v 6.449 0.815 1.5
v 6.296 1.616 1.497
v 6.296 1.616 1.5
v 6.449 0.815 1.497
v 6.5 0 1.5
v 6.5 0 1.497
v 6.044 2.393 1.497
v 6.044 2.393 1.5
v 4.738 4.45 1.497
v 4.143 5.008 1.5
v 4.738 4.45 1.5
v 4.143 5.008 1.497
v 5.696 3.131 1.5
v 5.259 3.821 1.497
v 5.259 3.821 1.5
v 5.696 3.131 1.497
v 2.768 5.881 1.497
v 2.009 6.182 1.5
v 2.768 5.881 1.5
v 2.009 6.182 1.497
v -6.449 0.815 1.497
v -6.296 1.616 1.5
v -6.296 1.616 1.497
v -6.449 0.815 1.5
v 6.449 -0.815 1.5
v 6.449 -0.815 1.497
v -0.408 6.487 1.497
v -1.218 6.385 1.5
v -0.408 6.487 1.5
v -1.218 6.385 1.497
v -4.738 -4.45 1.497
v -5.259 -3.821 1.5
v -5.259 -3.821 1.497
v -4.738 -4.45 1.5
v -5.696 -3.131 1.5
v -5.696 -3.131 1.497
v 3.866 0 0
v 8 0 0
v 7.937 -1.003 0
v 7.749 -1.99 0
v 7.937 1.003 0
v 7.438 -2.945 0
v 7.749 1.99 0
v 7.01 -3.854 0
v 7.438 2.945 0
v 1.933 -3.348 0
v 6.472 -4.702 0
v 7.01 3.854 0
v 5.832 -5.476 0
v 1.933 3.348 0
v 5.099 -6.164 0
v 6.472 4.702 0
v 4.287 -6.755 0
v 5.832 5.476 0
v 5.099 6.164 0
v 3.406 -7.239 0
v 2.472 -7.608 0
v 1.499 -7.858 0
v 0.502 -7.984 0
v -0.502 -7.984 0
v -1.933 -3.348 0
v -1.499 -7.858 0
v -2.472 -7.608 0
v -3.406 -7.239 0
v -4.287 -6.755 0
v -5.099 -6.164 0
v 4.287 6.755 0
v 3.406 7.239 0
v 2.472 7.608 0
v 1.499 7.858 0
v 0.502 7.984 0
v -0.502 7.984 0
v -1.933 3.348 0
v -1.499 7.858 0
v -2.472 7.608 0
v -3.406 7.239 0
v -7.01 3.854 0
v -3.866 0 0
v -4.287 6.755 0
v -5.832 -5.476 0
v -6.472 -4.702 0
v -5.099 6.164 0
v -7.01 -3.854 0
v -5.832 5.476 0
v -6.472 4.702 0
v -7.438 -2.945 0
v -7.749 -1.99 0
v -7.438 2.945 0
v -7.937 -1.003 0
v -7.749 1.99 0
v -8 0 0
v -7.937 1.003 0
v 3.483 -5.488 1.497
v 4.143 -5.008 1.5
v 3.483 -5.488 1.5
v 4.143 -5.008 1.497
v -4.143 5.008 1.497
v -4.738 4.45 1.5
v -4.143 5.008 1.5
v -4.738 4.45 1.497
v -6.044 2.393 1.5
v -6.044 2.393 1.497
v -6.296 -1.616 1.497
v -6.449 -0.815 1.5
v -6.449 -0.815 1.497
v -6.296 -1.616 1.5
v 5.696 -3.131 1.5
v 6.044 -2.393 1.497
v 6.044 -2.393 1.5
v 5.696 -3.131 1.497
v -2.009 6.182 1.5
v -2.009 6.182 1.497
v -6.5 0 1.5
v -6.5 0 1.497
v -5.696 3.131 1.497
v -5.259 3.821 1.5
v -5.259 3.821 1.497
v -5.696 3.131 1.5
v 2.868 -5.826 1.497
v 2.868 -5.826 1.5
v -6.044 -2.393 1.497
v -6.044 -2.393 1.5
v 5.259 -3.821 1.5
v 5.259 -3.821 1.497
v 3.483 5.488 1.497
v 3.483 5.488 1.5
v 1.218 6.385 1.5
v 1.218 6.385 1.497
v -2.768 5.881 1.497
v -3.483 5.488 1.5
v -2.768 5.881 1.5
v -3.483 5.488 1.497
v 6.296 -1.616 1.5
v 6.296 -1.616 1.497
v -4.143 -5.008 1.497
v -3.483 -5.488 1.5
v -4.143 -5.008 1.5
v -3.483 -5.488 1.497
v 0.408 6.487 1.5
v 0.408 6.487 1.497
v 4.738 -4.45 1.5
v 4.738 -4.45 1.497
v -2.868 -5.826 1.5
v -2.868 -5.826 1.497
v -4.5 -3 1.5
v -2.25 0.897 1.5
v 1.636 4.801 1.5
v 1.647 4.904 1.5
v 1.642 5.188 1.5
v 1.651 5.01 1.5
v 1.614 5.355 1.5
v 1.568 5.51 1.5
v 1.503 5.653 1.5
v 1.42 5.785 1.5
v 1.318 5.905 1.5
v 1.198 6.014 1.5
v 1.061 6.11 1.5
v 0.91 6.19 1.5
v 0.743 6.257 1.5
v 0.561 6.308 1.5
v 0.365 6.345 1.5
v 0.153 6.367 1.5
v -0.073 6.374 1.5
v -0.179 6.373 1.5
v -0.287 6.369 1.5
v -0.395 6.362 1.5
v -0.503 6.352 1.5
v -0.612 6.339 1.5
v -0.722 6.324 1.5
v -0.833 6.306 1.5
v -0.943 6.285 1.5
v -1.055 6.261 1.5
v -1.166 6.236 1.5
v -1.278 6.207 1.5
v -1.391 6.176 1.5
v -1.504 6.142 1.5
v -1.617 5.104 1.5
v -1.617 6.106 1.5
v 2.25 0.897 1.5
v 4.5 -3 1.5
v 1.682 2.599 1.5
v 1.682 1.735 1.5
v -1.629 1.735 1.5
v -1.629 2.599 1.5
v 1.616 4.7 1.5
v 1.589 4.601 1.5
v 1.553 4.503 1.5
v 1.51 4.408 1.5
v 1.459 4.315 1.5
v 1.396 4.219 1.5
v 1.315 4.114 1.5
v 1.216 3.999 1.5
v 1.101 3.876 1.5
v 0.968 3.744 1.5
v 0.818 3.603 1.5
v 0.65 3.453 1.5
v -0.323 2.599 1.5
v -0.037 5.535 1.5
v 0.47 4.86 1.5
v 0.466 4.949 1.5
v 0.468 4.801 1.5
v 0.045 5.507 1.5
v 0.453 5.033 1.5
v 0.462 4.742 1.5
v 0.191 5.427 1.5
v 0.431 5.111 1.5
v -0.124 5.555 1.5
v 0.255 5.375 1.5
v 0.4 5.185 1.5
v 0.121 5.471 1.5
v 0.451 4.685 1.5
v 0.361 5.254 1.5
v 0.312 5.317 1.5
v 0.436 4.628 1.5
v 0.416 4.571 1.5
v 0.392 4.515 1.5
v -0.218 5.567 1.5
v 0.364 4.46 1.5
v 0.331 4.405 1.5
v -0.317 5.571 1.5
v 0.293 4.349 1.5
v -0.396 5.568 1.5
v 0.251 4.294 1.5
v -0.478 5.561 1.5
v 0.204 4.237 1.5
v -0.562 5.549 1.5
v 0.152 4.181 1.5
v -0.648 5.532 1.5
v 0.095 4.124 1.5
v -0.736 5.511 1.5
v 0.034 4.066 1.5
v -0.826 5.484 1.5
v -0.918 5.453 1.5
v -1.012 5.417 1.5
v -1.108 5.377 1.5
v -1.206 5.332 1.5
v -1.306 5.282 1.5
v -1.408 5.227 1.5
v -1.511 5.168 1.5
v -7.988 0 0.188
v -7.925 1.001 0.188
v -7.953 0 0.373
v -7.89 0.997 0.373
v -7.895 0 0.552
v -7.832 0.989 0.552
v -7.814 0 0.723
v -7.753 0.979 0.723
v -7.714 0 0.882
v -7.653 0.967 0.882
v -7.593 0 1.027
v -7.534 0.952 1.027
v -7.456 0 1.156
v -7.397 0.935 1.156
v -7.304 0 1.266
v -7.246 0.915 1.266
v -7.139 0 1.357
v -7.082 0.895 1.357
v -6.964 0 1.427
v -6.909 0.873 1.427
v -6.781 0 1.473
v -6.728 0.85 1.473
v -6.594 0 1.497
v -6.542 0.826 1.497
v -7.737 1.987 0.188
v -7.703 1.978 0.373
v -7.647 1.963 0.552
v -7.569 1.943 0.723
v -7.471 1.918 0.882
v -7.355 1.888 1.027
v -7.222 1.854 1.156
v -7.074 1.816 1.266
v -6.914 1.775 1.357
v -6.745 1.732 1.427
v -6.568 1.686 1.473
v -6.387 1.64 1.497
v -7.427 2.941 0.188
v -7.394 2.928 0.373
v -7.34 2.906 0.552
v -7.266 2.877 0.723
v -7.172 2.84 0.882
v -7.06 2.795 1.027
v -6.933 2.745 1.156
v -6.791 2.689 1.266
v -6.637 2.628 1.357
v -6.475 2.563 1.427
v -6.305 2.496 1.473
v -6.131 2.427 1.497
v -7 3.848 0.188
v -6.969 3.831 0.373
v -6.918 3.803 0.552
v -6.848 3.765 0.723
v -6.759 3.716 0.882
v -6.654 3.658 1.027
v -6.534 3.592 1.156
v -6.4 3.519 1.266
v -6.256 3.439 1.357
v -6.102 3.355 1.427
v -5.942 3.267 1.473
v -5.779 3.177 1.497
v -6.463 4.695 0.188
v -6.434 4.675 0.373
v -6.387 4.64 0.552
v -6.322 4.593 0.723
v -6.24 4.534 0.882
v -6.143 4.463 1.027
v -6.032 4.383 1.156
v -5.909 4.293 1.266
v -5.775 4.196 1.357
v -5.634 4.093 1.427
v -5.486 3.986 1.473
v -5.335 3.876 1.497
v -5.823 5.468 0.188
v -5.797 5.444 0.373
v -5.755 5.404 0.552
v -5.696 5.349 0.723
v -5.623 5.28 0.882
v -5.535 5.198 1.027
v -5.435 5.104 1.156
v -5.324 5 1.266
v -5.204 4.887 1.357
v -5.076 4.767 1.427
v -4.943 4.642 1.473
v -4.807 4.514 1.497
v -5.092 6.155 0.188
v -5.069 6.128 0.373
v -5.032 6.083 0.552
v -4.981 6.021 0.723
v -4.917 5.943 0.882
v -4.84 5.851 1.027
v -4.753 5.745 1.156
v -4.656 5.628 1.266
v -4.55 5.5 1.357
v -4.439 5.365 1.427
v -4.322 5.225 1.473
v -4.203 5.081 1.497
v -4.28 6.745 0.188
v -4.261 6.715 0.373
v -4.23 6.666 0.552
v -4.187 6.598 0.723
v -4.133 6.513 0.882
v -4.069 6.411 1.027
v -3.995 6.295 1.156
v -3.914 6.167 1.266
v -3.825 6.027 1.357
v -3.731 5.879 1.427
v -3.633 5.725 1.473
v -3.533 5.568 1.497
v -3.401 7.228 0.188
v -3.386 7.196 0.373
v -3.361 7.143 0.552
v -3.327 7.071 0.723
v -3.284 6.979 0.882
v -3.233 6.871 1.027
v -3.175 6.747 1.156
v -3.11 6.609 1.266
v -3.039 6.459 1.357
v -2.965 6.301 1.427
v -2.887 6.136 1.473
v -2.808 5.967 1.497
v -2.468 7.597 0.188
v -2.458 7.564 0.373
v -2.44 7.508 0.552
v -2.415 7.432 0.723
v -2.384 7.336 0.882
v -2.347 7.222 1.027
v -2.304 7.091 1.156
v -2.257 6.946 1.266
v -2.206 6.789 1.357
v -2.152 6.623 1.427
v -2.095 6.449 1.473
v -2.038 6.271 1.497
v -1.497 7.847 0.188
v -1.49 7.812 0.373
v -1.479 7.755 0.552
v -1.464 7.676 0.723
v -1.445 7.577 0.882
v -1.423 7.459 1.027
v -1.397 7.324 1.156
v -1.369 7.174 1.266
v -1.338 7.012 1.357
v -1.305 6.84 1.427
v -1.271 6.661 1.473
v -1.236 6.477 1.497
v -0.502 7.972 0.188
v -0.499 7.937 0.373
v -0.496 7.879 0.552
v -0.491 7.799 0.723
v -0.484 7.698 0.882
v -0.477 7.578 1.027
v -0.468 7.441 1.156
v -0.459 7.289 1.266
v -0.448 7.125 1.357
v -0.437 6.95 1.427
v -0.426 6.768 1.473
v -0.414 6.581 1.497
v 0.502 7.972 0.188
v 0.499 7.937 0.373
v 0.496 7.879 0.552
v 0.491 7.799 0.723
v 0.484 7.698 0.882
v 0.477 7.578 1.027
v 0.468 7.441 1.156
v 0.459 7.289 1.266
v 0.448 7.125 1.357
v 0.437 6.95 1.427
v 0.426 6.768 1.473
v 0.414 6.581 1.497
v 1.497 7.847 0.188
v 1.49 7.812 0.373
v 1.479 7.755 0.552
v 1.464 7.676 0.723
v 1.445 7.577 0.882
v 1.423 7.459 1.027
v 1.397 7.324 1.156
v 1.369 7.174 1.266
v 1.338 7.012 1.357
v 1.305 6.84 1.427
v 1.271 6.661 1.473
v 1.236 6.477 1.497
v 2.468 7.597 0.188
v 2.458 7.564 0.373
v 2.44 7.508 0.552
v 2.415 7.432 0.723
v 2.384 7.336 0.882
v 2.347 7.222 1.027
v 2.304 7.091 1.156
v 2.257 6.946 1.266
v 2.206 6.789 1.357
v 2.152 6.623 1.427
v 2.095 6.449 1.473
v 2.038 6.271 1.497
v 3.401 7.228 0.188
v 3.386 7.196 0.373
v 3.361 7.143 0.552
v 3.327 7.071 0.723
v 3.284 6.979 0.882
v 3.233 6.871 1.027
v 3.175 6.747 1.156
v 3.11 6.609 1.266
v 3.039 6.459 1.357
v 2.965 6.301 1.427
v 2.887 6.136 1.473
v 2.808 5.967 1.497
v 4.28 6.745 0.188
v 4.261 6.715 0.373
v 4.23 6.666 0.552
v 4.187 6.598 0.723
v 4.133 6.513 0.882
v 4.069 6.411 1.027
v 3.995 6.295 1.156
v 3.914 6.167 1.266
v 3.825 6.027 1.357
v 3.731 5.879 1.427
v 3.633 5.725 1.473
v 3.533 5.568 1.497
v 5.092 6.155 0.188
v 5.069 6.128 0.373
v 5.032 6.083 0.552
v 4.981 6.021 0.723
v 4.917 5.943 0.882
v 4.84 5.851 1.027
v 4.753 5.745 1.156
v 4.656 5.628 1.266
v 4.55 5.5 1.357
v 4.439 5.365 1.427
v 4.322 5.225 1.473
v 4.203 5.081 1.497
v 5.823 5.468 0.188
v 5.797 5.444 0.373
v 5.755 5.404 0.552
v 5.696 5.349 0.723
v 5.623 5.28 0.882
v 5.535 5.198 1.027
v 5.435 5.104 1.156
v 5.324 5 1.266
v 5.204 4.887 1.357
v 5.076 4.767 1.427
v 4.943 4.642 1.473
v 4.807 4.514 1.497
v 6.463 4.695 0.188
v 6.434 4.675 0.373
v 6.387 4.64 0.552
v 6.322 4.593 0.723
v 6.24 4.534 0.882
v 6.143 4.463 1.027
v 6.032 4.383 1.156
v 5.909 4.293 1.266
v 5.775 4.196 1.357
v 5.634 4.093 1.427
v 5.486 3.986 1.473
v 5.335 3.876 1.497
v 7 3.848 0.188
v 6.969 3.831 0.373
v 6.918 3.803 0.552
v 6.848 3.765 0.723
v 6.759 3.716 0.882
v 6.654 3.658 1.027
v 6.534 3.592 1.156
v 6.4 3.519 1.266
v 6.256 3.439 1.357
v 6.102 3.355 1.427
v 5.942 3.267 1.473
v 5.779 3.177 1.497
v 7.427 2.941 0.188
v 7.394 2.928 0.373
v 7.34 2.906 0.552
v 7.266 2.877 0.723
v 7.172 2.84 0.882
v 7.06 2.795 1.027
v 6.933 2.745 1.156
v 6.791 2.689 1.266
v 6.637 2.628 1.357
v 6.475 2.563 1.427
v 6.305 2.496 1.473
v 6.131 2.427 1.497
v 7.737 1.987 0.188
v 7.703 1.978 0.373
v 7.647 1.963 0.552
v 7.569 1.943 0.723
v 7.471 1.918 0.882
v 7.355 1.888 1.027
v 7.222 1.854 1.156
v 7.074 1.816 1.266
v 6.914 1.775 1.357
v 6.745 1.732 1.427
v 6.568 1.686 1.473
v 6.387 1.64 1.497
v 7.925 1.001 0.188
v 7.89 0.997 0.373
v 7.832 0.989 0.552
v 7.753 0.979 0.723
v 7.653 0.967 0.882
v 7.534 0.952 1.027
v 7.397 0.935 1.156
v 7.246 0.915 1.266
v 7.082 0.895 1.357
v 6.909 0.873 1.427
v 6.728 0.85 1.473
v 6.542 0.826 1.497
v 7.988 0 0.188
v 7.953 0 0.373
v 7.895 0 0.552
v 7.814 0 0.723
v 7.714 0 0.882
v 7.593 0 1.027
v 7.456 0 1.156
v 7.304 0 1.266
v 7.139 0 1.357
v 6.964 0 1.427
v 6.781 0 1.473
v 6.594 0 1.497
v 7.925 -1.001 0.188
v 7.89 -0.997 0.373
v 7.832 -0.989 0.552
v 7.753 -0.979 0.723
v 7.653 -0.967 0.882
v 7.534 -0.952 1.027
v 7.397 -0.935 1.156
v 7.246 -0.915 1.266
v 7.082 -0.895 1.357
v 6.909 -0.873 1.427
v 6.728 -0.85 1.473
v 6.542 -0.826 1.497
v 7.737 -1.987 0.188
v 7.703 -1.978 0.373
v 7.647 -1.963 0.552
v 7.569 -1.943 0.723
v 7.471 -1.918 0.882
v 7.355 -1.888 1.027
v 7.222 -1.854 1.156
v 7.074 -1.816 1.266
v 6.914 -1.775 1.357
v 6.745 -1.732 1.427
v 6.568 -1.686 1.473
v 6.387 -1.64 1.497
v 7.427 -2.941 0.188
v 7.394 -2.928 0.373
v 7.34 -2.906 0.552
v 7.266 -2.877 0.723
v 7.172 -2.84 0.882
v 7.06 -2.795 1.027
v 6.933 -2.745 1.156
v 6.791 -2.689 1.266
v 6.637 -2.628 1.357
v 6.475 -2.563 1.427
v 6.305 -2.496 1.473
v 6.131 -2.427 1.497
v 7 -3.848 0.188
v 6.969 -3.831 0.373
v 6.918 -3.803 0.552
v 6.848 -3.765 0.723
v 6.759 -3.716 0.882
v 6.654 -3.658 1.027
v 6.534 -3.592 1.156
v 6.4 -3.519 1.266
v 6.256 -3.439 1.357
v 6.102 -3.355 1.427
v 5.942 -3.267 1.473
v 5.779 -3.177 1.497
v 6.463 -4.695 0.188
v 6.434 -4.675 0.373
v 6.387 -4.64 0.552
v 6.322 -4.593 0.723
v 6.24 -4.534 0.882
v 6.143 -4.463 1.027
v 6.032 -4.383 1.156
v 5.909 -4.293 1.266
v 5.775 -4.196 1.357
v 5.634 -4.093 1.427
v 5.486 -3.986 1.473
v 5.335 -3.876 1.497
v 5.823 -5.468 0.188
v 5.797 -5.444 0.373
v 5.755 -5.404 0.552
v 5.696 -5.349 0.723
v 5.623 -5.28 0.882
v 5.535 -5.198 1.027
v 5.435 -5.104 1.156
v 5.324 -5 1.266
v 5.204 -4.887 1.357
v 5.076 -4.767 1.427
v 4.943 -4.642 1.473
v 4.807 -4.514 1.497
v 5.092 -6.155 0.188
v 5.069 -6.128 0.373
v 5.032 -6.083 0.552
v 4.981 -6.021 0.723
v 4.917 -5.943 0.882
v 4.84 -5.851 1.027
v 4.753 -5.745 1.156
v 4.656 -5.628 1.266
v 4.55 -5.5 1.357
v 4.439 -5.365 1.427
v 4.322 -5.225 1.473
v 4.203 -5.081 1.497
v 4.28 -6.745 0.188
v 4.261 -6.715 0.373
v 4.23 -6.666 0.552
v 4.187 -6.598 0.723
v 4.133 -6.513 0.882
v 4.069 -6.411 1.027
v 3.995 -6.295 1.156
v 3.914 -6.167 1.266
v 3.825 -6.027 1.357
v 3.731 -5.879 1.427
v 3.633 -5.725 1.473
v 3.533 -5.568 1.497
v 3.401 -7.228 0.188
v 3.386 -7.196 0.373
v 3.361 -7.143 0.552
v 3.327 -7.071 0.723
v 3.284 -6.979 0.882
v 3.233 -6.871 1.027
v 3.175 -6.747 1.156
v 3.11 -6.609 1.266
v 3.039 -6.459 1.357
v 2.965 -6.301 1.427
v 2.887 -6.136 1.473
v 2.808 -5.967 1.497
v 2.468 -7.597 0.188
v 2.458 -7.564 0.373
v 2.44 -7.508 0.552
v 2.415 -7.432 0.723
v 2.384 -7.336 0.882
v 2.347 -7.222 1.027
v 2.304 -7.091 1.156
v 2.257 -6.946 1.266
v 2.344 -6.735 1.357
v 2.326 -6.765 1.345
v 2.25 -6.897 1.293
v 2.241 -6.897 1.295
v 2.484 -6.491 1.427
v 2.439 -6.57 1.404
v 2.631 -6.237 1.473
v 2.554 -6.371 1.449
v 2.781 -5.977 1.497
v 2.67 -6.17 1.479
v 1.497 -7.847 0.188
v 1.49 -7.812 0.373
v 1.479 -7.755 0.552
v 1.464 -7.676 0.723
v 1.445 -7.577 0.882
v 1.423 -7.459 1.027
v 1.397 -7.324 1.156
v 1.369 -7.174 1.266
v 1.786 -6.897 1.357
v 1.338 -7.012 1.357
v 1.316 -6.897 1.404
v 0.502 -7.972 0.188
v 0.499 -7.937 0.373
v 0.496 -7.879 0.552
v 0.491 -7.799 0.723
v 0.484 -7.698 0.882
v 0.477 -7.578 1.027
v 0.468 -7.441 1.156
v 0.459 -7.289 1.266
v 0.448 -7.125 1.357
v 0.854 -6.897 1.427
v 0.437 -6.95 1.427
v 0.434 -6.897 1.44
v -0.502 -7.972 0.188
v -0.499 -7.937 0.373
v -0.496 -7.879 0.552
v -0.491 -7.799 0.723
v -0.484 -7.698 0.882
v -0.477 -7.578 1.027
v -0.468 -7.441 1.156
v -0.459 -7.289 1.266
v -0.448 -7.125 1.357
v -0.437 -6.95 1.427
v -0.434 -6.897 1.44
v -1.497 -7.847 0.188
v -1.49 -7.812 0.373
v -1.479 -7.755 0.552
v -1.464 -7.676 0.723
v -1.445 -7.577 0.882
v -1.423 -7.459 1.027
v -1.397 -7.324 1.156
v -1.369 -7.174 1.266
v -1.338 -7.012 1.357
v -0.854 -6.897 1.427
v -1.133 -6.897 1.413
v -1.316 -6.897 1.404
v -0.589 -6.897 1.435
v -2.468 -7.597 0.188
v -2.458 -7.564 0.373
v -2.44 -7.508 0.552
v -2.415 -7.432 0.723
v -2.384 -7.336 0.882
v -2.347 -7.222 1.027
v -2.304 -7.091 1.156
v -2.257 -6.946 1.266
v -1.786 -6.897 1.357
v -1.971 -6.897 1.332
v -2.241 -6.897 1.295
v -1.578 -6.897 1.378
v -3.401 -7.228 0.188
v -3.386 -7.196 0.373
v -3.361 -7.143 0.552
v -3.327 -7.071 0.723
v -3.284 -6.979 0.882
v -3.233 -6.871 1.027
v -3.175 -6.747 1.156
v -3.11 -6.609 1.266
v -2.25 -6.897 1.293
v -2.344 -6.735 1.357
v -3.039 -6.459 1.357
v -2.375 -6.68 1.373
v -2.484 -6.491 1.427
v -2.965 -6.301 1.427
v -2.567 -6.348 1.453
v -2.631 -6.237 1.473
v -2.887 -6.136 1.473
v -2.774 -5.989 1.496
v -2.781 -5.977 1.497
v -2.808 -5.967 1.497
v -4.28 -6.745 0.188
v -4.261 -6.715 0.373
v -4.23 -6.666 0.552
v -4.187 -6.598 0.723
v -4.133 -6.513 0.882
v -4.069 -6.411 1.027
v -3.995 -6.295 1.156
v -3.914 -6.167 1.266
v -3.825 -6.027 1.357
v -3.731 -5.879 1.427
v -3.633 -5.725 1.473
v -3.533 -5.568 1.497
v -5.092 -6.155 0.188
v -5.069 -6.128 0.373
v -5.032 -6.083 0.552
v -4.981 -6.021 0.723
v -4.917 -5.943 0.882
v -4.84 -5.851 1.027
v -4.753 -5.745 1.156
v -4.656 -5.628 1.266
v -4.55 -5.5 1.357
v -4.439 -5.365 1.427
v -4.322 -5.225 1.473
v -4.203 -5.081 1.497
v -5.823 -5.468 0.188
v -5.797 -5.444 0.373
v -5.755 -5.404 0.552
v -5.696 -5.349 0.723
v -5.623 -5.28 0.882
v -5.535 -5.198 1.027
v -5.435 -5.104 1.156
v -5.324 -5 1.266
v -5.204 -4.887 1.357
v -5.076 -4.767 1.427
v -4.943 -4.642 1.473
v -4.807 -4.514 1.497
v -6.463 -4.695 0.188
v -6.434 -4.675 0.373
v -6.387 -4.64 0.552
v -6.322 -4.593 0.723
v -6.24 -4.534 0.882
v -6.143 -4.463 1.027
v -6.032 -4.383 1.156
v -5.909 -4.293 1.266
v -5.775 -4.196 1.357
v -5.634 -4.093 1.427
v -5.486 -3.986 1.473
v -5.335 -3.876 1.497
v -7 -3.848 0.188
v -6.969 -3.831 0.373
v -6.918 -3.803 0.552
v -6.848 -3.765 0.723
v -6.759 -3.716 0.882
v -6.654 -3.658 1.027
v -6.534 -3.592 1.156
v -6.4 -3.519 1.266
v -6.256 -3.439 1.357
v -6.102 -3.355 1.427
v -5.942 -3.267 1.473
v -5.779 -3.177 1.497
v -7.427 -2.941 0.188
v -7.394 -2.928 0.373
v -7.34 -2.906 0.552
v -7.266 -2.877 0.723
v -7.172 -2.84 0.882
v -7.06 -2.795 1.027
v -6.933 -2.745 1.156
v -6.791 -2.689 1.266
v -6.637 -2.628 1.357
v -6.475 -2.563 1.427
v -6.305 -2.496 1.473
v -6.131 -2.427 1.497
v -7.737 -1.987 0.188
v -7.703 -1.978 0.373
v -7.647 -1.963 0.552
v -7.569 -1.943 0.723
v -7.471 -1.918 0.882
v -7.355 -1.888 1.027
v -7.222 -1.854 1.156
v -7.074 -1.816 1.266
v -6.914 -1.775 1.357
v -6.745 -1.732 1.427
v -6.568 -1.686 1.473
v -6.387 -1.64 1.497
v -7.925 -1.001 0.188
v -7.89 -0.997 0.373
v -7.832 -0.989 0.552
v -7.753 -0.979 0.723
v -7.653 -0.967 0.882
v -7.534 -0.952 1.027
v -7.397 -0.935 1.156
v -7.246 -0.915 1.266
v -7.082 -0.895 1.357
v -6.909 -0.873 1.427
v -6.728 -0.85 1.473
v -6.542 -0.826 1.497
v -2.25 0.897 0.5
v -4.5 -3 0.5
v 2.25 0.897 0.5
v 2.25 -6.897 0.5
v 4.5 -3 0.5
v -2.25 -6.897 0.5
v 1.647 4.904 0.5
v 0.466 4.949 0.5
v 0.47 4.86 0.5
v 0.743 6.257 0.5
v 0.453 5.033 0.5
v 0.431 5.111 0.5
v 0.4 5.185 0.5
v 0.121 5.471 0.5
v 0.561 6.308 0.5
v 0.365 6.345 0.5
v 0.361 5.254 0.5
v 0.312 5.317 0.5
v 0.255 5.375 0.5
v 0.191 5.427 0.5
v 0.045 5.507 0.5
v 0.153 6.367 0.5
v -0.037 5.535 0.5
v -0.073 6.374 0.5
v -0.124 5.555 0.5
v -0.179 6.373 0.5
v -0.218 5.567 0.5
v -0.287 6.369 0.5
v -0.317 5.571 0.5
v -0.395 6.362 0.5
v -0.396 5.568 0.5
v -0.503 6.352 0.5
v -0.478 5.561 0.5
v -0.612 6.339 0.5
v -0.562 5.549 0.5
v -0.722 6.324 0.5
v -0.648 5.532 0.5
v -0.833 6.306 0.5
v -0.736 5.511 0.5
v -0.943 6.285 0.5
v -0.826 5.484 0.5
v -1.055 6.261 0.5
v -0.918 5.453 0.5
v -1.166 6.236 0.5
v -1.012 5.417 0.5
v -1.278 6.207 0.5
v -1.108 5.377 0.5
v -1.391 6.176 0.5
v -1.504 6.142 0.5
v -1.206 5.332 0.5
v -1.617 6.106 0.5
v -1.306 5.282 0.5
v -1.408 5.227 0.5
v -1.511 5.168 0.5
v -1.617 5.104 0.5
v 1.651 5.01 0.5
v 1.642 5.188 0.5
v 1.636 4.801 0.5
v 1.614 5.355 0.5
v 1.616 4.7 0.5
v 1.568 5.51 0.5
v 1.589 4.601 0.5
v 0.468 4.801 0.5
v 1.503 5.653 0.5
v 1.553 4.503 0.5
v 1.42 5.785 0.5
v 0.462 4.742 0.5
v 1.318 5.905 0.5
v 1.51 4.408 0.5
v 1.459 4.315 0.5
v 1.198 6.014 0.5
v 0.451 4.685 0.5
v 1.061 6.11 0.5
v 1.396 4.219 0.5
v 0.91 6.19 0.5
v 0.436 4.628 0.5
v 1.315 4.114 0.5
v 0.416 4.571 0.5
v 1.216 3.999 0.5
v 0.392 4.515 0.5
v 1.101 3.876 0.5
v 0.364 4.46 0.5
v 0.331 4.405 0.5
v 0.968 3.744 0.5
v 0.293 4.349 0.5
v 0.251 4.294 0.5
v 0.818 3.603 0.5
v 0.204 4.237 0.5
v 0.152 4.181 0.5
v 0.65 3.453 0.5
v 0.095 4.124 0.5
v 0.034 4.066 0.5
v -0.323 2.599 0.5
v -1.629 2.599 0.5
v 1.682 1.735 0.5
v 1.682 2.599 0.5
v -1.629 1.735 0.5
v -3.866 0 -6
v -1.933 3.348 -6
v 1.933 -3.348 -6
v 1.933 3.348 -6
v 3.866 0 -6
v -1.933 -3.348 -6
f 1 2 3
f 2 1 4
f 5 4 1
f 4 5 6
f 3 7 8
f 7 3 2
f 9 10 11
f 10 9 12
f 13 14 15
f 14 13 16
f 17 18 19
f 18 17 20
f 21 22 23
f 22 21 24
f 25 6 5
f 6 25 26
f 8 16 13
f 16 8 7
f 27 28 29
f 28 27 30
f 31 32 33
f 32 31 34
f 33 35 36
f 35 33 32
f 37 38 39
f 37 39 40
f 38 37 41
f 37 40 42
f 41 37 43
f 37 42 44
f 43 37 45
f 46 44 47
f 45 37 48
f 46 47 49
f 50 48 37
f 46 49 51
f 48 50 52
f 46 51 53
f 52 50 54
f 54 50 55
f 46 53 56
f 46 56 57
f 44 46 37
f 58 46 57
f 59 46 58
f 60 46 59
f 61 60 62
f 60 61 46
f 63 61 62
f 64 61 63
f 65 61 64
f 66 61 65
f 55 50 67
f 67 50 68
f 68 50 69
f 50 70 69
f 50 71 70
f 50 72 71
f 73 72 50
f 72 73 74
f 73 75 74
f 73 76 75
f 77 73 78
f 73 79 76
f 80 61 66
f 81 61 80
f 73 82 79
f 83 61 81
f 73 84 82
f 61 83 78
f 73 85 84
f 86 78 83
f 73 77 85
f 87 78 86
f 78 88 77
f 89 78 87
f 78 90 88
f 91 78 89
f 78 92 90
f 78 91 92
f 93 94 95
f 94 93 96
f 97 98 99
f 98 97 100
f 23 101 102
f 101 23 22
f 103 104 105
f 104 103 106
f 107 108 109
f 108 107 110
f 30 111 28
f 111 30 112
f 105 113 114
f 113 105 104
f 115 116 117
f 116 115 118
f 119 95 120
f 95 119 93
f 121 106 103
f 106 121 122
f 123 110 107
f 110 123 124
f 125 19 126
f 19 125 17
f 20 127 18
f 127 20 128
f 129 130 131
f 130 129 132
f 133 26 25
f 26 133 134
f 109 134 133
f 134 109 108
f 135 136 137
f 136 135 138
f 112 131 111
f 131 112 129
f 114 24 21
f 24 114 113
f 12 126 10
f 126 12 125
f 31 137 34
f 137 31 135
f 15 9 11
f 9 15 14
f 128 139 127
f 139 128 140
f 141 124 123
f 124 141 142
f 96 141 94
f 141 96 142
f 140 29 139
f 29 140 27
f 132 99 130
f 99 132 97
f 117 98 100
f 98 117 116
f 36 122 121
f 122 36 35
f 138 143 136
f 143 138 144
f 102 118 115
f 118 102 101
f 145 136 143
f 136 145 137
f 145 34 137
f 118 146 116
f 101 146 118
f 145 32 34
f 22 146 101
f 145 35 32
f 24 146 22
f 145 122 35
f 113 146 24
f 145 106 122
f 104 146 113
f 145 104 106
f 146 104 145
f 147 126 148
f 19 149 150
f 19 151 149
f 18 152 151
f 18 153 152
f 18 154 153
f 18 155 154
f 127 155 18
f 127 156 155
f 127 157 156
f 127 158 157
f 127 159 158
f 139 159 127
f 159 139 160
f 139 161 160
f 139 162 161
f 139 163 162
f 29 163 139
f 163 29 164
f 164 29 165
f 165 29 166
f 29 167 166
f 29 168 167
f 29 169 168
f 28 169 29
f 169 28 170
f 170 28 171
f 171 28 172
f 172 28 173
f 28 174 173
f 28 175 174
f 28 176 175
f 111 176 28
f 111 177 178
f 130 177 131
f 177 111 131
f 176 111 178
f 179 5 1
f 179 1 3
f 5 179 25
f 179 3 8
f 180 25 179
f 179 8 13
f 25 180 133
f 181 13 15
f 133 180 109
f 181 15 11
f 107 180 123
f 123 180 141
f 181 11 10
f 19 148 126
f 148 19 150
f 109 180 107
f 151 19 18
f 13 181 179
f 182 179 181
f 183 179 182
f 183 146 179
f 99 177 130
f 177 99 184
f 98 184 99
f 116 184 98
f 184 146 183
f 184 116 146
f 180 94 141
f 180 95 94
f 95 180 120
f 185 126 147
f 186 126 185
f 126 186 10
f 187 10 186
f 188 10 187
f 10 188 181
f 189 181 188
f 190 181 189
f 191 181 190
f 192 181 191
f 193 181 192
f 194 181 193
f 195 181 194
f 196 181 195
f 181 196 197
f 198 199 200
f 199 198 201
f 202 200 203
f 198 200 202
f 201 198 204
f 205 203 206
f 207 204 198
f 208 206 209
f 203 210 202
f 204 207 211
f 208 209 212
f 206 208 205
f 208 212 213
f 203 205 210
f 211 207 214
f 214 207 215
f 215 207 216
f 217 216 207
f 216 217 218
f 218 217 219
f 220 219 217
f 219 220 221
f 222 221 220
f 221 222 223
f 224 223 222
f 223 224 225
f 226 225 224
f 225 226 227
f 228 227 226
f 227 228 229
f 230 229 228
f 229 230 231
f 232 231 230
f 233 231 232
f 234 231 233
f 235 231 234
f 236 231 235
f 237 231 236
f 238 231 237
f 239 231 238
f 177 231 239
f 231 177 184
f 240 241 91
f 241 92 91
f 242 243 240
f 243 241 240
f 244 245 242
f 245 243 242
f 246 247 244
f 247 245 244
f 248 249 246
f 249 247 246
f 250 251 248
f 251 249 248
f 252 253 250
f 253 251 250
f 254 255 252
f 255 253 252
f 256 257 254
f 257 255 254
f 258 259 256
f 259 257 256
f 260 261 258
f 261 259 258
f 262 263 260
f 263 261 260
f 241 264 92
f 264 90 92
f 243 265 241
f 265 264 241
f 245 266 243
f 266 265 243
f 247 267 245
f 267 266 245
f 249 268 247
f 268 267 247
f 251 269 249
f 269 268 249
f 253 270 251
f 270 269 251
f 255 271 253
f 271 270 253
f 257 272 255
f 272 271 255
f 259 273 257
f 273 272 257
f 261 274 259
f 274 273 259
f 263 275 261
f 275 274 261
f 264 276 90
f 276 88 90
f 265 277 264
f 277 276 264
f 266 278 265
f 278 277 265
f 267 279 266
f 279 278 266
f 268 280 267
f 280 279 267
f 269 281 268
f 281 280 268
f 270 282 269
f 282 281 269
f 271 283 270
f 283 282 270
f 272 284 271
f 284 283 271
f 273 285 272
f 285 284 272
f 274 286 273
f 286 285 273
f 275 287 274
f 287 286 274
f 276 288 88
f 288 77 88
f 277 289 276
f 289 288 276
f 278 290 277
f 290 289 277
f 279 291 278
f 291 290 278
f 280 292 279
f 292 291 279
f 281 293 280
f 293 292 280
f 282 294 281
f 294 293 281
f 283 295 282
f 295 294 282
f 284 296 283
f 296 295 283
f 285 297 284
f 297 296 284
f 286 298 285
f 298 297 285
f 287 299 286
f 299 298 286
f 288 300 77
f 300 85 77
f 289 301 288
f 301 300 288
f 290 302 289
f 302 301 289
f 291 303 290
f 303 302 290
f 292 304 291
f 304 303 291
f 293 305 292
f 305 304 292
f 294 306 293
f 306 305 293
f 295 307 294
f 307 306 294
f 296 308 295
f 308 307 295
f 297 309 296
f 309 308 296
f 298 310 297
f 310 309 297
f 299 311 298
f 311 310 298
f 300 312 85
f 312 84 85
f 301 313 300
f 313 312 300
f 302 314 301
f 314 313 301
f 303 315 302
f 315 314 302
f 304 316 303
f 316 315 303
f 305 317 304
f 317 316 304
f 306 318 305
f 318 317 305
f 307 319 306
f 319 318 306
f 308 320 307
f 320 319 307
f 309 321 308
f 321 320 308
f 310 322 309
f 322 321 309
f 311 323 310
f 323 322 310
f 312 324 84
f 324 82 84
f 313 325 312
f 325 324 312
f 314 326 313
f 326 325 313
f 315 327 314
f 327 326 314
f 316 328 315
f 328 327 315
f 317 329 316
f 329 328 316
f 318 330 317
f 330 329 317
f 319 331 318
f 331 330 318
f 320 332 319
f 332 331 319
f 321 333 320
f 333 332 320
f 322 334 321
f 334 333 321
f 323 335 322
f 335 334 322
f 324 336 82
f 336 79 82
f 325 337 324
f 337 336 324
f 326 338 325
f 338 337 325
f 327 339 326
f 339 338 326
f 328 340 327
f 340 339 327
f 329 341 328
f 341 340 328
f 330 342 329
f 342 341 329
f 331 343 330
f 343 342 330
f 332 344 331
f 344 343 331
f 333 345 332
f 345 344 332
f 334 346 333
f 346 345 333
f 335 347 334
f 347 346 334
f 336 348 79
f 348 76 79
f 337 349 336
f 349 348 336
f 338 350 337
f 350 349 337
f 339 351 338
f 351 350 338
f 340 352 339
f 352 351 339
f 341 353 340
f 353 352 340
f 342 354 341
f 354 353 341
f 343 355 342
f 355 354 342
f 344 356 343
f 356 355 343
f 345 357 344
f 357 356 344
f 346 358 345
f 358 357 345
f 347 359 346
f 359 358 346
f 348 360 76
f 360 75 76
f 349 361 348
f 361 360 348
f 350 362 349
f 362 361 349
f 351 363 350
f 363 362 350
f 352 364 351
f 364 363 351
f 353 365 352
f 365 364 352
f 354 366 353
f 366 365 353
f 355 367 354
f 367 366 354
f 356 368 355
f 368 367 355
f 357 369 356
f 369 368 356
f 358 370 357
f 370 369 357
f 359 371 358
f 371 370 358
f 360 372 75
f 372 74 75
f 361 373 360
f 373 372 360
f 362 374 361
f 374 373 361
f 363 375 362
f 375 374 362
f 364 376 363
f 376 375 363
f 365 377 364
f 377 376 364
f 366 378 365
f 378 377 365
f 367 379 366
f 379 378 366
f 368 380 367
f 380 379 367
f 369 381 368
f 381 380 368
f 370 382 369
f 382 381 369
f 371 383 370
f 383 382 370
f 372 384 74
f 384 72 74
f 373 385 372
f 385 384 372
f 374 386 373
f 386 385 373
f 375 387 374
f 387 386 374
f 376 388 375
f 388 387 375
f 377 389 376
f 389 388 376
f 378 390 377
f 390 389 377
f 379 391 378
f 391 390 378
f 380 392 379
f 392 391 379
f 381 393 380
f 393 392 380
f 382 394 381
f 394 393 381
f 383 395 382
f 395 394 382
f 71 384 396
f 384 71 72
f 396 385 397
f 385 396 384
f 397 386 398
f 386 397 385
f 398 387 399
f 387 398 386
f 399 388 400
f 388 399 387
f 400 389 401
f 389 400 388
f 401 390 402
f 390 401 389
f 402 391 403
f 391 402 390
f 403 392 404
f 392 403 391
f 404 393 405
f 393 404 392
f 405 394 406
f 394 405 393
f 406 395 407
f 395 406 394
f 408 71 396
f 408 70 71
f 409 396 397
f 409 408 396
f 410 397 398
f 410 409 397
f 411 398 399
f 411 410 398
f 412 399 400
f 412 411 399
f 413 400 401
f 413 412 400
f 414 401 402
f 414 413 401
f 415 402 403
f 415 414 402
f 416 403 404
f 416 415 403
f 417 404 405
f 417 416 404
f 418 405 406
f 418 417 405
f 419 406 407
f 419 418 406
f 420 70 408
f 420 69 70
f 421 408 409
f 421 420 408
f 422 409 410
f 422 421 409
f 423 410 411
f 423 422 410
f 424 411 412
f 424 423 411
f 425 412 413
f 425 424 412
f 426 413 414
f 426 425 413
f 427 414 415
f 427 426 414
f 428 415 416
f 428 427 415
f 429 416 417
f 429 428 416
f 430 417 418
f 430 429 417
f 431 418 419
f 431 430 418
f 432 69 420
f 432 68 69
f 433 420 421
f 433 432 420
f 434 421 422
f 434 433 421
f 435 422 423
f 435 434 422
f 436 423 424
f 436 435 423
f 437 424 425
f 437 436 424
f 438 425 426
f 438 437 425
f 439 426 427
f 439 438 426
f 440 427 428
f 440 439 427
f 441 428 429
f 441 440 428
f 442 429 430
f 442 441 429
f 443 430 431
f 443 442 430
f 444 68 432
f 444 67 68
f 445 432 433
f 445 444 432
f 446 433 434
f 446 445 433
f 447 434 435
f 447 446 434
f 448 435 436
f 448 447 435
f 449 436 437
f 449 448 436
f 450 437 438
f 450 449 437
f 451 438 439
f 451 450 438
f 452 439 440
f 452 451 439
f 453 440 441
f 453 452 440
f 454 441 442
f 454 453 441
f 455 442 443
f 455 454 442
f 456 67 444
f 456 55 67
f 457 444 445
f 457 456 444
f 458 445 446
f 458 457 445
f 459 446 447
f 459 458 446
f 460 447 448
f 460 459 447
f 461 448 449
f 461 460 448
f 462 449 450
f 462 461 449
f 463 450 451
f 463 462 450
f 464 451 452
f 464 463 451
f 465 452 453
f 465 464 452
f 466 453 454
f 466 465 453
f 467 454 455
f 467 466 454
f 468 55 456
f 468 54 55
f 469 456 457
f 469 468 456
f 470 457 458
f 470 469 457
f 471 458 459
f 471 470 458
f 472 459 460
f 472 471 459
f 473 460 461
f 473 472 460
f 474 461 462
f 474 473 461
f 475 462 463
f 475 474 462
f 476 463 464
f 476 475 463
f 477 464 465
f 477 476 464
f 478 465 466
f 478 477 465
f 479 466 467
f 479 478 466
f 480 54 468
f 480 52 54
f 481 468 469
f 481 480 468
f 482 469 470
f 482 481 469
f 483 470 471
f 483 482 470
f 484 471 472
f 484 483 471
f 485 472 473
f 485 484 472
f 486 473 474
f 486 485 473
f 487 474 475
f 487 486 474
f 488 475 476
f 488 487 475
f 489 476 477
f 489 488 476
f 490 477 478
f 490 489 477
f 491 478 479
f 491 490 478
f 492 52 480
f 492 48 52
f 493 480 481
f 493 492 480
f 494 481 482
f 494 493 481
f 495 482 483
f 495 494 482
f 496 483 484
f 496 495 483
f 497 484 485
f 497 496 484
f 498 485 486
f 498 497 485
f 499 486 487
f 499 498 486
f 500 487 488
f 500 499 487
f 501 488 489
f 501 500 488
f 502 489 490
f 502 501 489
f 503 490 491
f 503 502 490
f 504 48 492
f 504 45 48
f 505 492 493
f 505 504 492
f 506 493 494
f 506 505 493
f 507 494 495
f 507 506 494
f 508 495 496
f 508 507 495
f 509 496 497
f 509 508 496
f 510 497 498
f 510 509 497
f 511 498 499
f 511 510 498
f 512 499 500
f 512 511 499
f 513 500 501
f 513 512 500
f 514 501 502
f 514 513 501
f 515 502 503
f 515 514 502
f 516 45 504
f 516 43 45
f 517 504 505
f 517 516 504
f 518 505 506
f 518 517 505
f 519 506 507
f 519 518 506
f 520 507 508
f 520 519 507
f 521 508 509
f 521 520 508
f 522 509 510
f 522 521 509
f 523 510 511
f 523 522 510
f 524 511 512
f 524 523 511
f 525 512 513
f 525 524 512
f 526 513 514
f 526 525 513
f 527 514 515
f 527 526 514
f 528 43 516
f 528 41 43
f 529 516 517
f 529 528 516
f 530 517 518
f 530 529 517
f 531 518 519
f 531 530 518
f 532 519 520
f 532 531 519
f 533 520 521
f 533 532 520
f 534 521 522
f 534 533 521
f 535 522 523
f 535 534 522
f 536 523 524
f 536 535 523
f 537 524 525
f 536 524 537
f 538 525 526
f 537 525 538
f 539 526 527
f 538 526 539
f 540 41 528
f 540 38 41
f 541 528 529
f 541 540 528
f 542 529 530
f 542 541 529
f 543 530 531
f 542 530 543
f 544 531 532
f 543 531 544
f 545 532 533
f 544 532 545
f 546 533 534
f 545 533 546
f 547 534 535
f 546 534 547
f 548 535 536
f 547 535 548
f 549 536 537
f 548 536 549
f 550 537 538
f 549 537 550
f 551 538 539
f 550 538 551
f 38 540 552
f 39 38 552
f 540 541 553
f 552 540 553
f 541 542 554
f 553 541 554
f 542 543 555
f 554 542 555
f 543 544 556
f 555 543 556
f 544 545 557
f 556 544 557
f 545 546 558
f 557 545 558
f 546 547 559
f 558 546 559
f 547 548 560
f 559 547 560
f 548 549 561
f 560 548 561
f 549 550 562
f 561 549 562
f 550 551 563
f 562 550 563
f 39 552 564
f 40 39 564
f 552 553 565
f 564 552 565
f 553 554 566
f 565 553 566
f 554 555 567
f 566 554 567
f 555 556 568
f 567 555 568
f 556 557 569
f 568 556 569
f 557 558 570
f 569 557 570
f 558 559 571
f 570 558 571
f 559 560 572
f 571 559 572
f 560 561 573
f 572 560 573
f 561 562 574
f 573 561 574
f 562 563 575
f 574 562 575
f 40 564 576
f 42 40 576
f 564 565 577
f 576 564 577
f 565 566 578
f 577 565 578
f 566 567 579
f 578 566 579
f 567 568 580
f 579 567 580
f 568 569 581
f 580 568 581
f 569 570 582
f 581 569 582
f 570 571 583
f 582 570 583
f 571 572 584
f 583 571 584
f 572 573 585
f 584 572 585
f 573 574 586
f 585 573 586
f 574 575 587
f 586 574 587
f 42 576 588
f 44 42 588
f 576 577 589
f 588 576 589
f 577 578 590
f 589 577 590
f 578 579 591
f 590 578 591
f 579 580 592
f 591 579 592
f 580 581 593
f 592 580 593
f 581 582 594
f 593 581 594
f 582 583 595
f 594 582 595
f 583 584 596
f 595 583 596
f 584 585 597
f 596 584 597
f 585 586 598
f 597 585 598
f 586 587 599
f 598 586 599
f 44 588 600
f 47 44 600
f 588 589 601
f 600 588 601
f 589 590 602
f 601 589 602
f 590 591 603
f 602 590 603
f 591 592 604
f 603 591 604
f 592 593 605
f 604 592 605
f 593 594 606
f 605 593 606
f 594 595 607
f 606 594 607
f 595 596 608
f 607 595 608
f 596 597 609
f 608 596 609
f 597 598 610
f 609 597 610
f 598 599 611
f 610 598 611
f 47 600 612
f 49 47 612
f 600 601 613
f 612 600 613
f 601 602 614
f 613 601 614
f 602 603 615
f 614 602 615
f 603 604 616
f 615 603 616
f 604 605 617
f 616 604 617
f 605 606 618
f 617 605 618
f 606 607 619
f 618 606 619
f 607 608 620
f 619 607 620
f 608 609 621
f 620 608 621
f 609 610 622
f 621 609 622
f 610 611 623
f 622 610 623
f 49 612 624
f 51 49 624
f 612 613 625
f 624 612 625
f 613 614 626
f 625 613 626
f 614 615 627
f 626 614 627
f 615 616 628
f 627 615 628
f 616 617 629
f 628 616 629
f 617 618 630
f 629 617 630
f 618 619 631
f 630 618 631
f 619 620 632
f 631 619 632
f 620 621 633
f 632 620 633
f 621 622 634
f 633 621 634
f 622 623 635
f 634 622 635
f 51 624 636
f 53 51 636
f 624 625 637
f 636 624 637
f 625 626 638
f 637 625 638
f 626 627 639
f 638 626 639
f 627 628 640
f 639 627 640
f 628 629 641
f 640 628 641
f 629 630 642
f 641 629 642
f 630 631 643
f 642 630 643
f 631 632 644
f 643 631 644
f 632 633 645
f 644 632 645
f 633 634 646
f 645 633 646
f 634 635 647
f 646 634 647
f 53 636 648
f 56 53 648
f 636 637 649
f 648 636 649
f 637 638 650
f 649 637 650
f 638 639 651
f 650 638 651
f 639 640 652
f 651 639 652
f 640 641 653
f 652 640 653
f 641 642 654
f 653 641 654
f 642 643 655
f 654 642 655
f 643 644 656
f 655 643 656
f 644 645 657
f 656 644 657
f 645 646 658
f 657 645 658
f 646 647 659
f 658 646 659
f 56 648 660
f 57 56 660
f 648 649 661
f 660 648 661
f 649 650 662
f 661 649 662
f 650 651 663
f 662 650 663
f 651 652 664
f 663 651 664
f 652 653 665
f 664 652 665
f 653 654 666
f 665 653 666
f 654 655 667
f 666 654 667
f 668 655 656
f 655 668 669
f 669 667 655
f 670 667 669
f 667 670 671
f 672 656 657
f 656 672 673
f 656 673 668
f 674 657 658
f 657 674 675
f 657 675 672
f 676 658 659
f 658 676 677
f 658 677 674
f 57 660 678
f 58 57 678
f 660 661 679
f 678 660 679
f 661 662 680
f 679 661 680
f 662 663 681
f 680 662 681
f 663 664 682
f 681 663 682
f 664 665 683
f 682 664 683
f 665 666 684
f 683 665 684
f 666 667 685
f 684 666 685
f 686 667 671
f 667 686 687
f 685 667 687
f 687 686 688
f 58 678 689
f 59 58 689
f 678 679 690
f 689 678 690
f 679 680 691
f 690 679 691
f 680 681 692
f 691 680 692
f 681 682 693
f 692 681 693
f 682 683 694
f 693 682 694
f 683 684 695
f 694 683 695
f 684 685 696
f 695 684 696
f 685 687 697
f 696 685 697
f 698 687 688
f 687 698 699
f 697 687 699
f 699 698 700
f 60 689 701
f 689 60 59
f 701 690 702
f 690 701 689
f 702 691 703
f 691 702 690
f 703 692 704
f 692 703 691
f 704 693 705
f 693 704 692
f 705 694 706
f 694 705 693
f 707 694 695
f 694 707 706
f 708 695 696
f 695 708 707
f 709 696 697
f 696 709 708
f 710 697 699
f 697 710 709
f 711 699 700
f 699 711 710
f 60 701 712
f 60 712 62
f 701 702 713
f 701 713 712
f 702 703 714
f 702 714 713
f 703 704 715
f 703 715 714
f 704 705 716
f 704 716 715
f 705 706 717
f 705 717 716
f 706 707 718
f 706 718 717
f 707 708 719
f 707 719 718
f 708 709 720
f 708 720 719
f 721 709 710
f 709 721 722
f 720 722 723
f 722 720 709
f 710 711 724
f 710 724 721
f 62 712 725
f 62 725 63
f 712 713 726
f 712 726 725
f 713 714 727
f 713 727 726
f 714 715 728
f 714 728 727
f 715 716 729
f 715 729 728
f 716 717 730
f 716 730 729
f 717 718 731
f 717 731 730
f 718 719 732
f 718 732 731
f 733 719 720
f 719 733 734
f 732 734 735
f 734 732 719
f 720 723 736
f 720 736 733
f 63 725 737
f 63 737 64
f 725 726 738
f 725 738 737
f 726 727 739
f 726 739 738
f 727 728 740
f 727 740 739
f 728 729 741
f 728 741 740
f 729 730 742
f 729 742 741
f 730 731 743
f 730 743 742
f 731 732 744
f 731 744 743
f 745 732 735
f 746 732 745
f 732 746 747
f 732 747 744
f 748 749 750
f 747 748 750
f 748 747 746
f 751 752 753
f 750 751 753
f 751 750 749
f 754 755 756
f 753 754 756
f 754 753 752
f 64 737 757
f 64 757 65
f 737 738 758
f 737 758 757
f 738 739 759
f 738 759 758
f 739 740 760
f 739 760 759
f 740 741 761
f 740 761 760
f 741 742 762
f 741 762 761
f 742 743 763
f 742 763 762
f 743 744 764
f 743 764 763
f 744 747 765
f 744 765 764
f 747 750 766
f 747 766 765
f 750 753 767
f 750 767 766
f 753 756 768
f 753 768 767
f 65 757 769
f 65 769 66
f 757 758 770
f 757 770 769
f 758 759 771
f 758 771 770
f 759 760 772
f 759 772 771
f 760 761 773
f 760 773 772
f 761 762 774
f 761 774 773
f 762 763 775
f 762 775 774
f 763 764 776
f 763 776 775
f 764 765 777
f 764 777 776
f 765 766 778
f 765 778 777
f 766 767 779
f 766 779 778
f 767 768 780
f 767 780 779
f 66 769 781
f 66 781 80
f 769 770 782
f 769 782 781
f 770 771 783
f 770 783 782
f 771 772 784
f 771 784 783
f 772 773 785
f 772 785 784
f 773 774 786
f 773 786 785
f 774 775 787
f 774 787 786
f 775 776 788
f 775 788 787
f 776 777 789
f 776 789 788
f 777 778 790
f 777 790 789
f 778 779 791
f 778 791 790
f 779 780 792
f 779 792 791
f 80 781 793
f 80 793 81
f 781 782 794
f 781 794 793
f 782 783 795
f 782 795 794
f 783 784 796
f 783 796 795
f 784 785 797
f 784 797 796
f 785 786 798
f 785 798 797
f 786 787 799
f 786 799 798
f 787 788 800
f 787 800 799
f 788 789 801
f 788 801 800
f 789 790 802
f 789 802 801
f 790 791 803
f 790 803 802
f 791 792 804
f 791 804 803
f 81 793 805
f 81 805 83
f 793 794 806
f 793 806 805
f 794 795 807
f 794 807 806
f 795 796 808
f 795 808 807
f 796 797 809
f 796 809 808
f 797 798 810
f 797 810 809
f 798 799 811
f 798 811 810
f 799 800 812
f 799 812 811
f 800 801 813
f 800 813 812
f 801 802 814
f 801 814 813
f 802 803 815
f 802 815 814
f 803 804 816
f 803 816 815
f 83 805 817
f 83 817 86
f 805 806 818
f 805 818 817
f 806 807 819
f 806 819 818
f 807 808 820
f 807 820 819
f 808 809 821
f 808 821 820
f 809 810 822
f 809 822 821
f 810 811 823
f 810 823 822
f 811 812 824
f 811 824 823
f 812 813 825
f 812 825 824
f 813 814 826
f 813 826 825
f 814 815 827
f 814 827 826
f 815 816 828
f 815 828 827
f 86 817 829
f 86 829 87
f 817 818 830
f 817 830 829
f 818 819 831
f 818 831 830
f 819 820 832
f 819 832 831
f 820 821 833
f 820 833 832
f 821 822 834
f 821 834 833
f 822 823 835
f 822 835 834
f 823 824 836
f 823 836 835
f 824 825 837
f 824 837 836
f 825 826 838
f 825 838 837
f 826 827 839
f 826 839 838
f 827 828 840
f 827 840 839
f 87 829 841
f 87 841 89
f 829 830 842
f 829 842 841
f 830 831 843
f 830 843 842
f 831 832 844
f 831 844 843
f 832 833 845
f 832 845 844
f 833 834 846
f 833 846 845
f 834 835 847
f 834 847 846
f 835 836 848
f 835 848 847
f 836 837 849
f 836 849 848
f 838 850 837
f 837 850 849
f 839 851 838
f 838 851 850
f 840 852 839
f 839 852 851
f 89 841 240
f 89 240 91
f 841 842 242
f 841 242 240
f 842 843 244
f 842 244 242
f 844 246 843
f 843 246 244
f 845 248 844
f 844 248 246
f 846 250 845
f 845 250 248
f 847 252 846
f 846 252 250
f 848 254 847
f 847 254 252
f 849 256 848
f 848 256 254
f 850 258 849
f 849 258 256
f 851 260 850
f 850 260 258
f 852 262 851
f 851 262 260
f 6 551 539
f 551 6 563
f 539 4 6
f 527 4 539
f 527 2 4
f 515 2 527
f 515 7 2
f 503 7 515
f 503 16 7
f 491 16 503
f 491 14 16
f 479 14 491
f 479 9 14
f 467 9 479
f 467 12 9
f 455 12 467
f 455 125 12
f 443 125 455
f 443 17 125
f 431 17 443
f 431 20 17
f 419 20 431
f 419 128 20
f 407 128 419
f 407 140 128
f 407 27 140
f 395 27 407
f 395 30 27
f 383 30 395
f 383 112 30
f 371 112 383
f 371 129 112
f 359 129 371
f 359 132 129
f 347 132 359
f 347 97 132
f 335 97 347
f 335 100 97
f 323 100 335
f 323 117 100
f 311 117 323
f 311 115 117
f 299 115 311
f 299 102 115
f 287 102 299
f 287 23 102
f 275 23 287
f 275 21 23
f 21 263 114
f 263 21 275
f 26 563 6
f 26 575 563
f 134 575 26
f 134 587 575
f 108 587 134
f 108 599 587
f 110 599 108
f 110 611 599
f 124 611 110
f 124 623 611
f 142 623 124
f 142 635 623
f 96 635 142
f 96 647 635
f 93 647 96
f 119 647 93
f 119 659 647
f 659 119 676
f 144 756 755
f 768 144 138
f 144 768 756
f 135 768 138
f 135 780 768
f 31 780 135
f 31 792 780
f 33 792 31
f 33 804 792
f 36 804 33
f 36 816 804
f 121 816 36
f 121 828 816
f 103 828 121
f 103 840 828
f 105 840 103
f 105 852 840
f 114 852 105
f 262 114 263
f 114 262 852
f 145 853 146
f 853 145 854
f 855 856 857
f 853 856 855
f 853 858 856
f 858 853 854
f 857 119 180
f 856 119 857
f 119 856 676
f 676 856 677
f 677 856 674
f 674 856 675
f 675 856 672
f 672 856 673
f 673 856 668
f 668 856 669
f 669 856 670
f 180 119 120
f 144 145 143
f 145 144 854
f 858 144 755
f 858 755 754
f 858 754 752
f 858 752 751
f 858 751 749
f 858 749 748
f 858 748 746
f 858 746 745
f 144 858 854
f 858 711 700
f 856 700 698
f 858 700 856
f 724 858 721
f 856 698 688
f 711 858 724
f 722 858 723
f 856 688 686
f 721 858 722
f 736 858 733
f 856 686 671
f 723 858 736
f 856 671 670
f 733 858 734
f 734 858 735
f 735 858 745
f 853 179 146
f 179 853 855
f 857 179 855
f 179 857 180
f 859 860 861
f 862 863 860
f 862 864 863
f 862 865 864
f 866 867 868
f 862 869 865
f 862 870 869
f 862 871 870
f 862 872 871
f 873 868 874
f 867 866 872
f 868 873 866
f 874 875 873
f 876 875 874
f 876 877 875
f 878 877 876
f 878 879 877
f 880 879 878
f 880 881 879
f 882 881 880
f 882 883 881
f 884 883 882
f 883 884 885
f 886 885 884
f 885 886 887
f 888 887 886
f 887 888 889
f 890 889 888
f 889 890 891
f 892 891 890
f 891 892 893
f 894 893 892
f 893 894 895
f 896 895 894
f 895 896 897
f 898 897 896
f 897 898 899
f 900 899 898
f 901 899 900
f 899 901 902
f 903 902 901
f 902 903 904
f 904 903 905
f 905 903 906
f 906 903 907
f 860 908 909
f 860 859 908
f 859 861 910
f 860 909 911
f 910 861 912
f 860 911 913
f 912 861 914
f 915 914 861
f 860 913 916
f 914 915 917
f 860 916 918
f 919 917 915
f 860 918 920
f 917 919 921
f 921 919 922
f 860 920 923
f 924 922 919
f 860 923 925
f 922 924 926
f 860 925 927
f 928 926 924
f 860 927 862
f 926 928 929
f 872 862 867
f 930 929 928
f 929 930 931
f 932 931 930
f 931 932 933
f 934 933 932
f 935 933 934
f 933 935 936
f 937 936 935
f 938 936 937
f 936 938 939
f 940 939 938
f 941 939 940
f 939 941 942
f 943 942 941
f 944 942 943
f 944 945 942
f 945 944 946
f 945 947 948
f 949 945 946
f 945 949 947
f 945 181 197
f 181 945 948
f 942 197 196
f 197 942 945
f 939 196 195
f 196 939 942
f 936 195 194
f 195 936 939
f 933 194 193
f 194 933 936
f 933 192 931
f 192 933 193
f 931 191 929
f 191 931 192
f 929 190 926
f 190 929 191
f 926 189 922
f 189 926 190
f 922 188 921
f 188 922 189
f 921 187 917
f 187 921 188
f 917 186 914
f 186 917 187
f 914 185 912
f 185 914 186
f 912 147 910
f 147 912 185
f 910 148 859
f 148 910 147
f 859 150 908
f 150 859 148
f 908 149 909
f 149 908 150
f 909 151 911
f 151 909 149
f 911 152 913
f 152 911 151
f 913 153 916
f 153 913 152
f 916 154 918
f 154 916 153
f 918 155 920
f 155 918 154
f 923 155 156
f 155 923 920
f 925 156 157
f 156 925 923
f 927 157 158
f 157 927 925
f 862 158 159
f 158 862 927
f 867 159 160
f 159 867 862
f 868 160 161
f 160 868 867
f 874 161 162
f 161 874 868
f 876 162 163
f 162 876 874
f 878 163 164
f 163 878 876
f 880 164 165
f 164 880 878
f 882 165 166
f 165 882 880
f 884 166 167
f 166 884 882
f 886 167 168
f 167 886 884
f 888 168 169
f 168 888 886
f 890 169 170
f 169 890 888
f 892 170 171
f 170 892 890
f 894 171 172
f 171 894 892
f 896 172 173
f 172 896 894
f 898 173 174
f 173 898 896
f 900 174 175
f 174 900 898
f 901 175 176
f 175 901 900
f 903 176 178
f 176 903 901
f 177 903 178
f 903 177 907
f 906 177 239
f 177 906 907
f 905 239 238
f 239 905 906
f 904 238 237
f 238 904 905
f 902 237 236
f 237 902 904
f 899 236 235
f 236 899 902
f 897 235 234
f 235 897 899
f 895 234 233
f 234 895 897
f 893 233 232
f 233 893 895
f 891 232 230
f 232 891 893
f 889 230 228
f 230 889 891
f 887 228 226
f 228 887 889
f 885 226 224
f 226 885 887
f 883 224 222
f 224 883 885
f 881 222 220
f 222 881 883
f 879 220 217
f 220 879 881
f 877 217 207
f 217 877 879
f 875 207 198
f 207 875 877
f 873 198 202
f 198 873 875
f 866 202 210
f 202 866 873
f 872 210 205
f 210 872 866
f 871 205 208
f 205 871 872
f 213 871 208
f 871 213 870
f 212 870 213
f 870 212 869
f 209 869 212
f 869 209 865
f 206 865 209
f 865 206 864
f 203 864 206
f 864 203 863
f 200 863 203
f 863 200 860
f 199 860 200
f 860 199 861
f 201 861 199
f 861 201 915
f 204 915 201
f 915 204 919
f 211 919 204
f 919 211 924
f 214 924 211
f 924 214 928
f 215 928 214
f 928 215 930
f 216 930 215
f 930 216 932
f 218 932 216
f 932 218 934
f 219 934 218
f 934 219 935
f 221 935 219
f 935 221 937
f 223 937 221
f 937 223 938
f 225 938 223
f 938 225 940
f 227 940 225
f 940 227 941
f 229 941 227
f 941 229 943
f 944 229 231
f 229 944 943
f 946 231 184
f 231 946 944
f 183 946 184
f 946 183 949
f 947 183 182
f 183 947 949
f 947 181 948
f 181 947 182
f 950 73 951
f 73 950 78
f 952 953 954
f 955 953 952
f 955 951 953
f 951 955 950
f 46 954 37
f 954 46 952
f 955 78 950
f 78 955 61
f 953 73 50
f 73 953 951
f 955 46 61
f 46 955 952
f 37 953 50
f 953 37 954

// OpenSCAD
$fn = 50;


union() {
	difference() {
		union() {
			cylinder(h = 1.5000000000, r = 6.5000000000);
			rotate_extrude(angle = 360) {
				translate(v = [6.5000000000, 0, 0]) {
					circle(r = 1.5000000000);
				}
			}
		}
		union() {
			translate(v = [-25.0000000000, -25.0000000000, -50]) {
				cube(size = [50, 50, 50]);
			}
			translate(v = [0, -3, 0.5000000000]) {
				#linear_extrude(height = 1) {
					polygon(points = [[4.5000000000, 0.0000000000], [2.2500000000, 3.8971143170], [-2.2500000000, 3.8971143170], [-4.5000000000, 0.0000000000], [-2.2500000000, -3.8971143170], [2.2500000000, -3.8971143170]]);
				}
			}
			#translate(v = [0, 4, 0.5000000000]) {
				linear_extrude(height = 1) {
					text(font = "SegoiUI:Bold", halign = "center", size = 4.5000000000, text = "2", valign = "center");
				}
			}
		}
	}
	union() {
		translate(v = [0, 0, -6]) {
			linear_extrude(height = 6) {
				polygon(points = [[3.8658550000, 0.0000000000], [1.9329275000, 3.3479286373], [-1.9329275000, 3.3479286373], [-3.8658550000, 0.0000000000], [-1.9329275000, -3.3479286373], [1.9329275000, -3.3479286373]]);
			}
		}
	}
}
